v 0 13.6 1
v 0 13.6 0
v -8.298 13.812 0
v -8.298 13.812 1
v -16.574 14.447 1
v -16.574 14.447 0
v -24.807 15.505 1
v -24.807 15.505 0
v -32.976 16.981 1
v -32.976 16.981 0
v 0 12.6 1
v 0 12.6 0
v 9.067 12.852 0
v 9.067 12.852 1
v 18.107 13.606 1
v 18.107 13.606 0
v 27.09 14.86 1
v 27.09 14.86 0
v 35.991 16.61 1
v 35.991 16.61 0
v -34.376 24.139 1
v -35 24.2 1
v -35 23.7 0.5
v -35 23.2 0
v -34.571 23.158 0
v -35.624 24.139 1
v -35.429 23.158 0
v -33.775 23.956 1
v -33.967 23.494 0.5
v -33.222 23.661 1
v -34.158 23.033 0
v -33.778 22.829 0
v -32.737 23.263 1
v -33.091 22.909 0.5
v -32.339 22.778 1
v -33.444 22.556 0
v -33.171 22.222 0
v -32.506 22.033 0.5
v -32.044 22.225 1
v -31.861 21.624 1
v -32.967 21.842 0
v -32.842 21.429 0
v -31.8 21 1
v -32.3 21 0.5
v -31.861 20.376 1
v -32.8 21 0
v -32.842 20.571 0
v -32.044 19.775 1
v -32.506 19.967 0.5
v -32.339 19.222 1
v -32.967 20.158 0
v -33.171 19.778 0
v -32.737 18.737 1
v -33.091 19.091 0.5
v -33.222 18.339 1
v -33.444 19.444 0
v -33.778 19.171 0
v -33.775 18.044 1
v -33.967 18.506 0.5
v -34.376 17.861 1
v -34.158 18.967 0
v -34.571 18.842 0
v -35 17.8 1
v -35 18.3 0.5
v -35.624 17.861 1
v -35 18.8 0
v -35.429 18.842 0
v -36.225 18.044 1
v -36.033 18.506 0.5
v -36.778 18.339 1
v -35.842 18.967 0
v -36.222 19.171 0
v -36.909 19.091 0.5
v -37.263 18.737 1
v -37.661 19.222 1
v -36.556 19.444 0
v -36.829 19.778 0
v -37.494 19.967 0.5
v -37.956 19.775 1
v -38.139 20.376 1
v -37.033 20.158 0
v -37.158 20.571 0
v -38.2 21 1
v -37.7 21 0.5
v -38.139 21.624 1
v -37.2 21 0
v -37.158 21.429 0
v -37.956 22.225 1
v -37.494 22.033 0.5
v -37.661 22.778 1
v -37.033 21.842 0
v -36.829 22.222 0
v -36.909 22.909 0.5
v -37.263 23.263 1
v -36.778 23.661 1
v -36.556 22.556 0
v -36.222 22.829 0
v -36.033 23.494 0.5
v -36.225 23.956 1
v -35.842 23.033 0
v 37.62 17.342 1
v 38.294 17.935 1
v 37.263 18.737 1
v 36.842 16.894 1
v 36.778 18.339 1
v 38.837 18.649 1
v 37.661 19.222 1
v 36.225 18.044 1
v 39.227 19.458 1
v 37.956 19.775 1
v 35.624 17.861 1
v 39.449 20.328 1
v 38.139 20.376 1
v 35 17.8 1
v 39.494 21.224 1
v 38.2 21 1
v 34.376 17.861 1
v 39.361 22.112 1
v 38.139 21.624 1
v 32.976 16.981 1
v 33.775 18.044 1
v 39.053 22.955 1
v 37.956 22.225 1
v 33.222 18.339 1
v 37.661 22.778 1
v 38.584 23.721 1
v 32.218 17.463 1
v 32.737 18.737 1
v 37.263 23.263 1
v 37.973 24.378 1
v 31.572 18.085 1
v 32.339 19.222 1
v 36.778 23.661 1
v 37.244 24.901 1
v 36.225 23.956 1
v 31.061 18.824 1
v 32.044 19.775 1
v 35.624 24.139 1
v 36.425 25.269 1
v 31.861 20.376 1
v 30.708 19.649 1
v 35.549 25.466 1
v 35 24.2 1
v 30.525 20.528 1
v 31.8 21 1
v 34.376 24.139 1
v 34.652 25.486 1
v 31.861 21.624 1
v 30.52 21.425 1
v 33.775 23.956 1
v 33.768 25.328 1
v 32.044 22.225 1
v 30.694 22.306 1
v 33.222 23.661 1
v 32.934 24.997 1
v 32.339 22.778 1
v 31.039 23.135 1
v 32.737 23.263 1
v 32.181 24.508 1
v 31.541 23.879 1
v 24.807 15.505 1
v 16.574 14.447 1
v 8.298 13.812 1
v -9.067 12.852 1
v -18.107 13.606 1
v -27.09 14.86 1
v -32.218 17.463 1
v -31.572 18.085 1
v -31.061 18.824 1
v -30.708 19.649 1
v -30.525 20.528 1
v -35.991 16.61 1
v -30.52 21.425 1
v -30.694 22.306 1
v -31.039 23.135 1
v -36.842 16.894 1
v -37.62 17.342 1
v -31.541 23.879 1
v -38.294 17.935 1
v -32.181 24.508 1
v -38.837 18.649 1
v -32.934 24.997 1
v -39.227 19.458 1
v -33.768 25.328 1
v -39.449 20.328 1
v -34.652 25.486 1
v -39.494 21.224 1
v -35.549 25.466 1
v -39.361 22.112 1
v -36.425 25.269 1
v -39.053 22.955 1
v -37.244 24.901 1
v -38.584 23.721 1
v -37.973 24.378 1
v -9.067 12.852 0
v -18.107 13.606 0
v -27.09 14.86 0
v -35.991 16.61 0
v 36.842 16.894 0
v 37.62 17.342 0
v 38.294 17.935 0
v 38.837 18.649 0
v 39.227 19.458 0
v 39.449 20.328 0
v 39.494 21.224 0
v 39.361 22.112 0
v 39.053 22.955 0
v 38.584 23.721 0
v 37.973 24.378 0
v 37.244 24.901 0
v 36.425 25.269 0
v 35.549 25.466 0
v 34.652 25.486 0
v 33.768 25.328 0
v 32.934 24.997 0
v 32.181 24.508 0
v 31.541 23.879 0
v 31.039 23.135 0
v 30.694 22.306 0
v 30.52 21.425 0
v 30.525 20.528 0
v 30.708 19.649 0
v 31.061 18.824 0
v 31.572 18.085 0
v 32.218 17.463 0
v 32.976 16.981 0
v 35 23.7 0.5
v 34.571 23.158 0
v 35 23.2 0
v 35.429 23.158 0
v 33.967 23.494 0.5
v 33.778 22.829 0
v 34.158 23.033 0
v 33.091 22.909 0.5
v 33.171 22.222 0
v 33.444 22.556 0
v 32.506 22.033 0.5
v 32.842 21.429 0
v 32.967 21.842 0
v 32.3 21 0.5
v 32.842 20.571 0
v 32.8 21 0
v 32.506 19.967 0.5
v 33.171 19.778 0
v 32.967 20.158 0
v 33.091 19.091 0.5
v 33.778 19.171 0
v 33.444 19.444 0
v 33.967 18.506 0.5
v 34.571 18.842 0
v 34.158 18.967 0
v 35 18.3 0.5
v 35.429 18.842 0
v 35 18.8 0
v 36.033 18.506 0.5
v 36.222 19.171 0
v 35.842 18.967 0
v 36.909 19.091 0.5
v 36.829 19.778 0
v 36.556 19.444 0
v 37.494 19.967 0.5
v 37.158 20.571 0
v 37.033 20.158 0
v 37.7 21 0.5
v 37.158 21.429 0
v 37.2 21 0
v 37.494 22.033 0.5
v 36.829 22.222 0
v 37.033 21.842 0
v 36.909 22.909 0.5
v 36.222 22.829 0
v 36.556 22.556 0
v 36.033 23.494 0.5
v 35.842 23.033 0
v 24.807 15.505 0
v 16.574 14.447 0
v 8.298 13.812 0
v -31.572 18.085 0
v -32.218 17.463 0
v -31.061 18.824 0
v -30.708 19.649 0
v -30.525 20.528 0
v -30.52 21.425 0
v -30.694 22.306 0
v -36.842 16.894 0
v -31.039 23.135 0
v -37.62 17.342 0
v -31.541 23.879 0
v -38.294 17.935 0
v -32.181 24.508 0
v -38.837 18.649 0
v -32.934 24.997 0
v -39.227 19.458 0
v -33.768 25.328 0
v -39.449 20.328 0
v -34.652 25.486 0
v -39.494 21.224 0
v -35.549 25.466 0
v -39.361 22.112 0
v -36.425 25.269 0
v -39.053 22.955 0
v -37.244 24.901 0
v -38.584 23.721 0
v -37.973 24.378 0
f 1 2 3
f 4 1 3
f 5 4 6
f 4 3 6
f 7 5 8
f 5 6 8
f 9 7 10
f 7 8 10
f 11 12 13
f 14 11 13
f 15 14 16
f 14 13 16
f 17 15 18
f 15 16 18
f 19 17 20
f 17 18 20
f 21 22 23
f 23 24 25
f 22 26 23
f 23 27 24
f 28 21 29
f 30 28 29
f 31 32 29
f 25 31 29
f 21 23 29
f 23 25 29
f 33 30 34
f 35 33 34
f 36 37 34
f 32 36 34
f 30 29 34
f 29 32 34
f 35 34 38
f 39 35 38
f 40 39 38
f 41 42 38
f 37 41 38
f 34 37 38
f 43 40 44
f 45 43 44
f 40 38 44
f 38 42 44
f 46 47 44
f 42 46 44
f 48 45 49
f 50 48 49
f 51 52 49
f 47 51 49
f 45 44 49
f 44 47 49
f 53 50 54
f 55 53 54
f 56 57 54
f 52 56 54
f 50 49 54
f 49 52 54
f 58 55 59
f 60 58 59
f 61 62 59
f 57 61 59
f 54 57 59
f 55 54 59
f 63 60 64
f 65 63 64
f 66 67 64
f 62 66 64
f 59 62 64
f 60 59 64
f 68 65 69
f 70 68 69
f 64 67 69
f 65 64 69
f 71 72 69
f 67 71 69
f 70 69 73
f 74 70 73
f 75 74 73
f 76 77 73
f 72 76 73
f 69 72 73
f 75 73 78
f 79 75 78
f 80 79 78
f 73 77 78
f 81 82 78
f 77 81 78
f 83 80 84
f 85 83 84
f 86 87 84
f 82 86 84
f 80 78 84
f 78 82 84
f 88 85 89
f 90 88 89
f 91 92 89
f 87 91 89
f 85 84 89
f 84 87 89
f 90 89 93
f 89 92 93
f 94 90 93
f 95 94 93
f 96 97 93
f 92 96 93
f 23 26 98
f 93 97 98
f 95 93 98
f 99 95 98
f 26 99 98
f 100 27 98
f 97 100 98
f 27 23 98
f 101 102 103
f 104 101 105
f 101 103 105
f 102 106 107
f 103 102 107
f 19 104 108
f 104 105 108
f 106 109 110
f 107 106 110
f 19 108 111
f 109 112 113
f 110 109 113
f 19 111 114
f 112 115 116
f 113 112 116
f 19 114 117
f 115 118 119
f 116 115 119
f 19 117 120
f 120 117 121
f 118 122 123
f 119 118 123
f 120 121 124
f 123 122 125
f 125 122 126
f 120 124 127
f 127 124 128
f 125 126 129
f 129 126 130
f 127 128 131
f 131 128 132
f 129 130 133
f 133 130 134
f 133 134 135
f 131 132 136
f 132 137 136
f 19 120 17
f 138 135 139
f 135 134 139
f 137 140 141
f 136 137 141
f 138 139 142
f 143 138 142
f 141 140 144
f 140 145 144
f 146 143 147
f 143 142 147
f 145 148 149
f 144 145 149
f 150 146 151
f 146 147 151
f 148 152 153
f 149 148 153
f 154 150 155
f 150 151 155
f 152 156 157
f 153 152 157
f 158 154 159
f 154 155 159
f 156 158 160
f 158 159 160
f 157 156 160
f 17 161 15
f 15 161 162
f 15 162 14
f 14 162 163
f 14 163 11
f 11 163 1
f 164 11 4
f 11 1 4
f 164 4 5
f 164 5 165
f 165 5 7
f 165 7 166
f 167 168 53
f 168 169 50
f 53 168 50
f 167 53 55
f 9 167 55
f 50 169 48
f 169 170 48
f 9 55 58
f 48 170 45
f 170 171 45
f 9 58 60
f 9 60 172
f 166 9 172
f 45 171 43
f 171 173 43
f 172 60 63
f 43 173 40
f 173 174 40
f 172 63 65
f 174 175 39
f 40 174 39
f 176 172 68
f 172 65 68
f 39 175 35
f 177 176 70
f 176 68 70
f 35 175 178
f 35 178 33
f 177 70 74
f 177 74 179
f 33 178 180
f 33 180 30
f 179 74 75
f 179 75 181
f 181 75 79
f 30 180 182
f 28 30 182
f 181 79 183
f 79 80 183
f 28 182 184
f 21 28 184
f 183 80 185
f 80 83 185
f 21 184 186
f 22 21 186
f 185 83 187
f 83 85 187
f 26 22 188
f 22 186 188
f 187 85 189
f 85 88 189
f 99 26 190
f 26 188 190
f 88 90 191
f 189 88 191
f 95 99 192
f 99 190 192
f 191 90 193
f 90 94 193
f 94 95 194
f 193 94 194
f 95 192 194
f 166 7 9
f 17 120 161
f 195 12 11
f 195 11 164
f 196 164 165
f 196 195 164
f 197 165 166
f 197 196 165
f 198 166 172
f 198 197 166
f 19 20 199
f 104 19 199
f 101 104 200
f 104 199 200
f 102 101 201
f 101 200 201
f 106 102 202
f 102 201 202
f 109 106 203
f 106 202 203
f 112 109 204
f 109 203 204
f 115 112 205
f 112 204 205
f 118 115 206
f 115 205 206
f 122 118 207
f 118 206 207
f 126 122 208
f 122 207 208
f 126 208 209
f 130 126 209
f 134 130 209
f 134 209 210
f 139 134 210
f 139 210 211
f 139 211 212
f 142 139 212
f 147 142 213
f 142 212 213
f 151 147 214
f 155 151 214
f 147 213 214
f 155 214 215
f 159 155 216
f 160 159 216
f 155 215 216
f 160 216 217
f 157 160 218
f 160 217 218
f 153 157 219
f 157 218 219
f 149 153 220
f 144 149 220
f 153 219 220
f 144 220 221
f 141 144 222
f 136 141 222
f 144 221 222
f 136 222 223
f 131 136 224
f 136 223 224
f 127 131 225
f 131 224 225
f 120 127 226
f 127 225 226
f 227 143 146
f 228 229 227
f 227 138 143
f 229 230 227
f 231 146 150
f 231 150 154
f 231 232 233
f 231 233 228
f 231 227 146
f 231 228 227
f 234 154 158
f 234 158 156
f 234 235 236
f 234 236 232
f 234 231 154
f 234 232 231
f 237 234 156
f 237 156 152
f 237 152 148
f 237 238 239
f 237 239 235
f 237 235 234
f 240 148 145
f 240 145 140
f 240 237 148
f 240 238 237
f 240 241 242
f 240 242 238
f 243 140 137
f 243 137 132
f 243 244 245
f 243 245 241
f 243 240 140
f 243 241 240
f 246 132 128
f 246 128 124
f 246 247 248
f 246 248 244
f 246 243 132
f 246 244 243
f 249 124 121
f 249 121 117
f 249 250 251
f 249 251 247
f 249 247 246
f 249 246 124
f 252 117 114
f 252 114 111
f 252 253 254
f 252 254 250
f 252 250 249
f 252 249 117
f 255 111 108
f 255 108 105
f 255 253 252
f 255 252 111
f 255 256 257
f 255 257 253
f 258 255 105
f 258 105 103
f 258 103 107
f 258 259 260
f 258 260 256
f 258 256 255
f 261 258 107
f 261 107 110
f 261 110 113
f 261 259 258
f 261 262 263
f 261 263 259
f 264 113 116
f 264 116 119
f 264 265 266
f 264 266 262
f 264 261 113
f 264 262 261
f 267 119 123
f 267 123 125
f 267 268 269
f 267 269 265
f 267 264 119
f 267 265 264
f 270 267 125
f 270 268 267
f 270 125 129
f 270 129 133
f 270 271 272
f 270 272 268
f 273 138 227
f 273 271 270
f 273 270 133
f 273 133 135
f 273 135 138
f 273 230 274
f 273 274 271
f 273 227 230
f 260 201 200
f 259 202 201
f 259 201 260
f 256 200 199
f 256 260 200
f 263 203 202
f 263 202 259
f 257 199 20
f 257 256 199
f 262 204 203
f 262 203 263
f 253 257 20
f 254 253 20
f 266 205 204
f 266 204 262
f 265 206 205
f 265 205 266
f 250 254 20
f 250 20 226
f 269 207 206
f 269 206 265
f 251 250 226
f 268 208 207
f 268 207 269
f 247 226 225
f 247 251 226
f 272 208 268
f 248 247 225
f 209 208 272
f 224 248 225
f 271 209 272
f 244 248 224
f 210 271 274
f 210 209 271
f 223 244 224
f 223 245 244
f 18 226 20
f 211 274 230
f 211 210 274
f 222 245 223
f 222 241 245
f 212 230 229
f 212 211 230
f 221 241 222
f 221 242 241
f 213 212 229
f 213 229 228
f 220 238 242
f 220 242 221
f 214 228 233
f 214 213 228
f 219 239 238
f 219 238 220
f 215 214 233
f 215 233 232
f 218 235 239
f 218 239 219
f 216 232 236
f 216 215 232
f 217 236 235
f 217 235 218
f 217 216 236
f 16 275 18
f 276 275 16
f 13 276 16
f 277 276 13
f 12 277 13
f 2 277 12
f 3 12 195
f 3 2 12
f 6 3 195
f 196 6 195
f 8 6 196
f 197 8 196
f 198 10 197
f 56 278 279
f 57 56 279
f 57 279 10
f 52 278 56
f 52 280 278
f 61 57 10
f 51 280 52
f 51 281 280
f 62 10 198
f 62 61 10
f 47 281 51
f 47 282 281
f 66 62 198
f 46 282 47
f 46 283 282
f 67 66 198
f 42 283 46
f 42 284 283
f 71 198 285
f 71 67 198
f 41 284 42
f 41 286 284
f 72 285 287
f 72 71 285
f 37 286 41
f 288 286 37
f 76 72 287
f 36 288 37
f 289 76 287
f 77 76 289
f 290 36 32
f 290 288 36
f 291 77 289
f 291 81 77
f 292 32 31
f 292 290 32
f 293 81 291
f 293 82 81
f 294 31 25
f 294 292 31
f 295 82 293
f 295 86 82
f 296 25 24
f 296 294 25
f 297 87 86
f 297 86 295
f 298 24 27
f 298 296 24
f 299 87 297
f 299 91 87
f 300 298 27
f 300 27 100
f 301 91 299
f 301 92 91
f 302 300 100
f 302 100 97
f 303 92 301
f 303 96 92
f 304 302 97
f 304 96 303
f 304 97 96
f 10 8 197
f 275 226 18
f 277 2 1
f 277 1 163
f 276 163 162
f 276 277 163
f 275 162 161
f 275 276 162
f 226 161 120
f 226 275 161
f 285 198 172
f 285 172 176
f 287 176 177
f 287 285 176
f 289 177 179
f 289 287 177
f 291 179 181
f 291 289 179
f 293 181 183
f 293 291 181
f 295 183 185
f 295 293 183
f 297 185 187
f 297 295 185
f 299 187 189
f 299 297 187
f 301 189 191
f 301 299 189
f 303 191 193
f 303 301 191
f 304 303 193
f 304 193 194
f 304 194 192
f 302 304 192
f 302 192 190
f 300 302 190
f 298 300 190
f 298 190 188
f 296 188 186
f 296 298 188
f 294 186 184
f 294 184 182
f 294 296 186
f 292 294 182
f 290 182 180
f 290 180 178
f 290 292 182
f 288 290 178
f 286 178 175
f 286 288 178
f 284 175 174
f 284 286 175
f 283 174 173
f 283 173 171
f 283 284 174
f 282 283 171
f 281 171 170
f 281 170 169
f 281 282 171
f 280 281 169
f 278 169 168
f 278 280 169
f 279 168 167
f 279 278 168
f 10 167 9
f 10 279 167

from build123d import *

# Parameters (mm, degrees)
PAD_DEPTH = 1


with BuildPart() as clone_of_countersunk001:
    # Sketch007 → Revolution001 (revolve)
    with BuildSketch(Plane.YZ):
        Polygon((3.2, 0), (1.5, -1.7), (1.5, -15), (0, -15), (0, 0), align=None)
    revolve(axis=Axis((0, 0, 0), (0, 0, 1)))


with BuildPart() as clone_of_countersunk001_1:
    # Clone placement: moved
    add(clone_of_countersunk001.part.moved(Location((35, 21, 1))))


with BuildPart() as countersunkcut:
    # Sketch → Pad (new body)
    with BuildSketch(Plane.XY):
        with BuildLine():
            ThreePointArc((35.990539, 16.610372), (35.549071, 25.466377), (32.975752, 16.980993))
            ThreePointArc((0, 13.6), (16.574312, 14.447458), (32.975752, 16.980993))
            Line((0, 13.6), (0, 12.6))
            ThreePointArc((0, 12.6), (18.106642, 13.605686), (35.990539, 16.610372))
        make_face()
    extrude(amount=PAD_DEPTH)

    # Cut: cut Clone of Countersunk001
    add(clone_of_countersunk001_1.part, mode=Mode.SUBTRACT)


with BuildPart() as part_mirroring:
    # Part__Mirroring: instance of CountersunkCut
    add(countersunkcut.part.mirror(Plane(origin=(0, 0, 0), x_dir=(0, -1, 0), z_dir=(1, 0, 0))))


with BuildPart() as sidemirror:
    # Fusion base: copy of CountersunkCut
    add(countersunkcut.part)

    # Fusion: union Part__Mirroring
    add(part_mirroring.part)


solid = sidemirror.part
